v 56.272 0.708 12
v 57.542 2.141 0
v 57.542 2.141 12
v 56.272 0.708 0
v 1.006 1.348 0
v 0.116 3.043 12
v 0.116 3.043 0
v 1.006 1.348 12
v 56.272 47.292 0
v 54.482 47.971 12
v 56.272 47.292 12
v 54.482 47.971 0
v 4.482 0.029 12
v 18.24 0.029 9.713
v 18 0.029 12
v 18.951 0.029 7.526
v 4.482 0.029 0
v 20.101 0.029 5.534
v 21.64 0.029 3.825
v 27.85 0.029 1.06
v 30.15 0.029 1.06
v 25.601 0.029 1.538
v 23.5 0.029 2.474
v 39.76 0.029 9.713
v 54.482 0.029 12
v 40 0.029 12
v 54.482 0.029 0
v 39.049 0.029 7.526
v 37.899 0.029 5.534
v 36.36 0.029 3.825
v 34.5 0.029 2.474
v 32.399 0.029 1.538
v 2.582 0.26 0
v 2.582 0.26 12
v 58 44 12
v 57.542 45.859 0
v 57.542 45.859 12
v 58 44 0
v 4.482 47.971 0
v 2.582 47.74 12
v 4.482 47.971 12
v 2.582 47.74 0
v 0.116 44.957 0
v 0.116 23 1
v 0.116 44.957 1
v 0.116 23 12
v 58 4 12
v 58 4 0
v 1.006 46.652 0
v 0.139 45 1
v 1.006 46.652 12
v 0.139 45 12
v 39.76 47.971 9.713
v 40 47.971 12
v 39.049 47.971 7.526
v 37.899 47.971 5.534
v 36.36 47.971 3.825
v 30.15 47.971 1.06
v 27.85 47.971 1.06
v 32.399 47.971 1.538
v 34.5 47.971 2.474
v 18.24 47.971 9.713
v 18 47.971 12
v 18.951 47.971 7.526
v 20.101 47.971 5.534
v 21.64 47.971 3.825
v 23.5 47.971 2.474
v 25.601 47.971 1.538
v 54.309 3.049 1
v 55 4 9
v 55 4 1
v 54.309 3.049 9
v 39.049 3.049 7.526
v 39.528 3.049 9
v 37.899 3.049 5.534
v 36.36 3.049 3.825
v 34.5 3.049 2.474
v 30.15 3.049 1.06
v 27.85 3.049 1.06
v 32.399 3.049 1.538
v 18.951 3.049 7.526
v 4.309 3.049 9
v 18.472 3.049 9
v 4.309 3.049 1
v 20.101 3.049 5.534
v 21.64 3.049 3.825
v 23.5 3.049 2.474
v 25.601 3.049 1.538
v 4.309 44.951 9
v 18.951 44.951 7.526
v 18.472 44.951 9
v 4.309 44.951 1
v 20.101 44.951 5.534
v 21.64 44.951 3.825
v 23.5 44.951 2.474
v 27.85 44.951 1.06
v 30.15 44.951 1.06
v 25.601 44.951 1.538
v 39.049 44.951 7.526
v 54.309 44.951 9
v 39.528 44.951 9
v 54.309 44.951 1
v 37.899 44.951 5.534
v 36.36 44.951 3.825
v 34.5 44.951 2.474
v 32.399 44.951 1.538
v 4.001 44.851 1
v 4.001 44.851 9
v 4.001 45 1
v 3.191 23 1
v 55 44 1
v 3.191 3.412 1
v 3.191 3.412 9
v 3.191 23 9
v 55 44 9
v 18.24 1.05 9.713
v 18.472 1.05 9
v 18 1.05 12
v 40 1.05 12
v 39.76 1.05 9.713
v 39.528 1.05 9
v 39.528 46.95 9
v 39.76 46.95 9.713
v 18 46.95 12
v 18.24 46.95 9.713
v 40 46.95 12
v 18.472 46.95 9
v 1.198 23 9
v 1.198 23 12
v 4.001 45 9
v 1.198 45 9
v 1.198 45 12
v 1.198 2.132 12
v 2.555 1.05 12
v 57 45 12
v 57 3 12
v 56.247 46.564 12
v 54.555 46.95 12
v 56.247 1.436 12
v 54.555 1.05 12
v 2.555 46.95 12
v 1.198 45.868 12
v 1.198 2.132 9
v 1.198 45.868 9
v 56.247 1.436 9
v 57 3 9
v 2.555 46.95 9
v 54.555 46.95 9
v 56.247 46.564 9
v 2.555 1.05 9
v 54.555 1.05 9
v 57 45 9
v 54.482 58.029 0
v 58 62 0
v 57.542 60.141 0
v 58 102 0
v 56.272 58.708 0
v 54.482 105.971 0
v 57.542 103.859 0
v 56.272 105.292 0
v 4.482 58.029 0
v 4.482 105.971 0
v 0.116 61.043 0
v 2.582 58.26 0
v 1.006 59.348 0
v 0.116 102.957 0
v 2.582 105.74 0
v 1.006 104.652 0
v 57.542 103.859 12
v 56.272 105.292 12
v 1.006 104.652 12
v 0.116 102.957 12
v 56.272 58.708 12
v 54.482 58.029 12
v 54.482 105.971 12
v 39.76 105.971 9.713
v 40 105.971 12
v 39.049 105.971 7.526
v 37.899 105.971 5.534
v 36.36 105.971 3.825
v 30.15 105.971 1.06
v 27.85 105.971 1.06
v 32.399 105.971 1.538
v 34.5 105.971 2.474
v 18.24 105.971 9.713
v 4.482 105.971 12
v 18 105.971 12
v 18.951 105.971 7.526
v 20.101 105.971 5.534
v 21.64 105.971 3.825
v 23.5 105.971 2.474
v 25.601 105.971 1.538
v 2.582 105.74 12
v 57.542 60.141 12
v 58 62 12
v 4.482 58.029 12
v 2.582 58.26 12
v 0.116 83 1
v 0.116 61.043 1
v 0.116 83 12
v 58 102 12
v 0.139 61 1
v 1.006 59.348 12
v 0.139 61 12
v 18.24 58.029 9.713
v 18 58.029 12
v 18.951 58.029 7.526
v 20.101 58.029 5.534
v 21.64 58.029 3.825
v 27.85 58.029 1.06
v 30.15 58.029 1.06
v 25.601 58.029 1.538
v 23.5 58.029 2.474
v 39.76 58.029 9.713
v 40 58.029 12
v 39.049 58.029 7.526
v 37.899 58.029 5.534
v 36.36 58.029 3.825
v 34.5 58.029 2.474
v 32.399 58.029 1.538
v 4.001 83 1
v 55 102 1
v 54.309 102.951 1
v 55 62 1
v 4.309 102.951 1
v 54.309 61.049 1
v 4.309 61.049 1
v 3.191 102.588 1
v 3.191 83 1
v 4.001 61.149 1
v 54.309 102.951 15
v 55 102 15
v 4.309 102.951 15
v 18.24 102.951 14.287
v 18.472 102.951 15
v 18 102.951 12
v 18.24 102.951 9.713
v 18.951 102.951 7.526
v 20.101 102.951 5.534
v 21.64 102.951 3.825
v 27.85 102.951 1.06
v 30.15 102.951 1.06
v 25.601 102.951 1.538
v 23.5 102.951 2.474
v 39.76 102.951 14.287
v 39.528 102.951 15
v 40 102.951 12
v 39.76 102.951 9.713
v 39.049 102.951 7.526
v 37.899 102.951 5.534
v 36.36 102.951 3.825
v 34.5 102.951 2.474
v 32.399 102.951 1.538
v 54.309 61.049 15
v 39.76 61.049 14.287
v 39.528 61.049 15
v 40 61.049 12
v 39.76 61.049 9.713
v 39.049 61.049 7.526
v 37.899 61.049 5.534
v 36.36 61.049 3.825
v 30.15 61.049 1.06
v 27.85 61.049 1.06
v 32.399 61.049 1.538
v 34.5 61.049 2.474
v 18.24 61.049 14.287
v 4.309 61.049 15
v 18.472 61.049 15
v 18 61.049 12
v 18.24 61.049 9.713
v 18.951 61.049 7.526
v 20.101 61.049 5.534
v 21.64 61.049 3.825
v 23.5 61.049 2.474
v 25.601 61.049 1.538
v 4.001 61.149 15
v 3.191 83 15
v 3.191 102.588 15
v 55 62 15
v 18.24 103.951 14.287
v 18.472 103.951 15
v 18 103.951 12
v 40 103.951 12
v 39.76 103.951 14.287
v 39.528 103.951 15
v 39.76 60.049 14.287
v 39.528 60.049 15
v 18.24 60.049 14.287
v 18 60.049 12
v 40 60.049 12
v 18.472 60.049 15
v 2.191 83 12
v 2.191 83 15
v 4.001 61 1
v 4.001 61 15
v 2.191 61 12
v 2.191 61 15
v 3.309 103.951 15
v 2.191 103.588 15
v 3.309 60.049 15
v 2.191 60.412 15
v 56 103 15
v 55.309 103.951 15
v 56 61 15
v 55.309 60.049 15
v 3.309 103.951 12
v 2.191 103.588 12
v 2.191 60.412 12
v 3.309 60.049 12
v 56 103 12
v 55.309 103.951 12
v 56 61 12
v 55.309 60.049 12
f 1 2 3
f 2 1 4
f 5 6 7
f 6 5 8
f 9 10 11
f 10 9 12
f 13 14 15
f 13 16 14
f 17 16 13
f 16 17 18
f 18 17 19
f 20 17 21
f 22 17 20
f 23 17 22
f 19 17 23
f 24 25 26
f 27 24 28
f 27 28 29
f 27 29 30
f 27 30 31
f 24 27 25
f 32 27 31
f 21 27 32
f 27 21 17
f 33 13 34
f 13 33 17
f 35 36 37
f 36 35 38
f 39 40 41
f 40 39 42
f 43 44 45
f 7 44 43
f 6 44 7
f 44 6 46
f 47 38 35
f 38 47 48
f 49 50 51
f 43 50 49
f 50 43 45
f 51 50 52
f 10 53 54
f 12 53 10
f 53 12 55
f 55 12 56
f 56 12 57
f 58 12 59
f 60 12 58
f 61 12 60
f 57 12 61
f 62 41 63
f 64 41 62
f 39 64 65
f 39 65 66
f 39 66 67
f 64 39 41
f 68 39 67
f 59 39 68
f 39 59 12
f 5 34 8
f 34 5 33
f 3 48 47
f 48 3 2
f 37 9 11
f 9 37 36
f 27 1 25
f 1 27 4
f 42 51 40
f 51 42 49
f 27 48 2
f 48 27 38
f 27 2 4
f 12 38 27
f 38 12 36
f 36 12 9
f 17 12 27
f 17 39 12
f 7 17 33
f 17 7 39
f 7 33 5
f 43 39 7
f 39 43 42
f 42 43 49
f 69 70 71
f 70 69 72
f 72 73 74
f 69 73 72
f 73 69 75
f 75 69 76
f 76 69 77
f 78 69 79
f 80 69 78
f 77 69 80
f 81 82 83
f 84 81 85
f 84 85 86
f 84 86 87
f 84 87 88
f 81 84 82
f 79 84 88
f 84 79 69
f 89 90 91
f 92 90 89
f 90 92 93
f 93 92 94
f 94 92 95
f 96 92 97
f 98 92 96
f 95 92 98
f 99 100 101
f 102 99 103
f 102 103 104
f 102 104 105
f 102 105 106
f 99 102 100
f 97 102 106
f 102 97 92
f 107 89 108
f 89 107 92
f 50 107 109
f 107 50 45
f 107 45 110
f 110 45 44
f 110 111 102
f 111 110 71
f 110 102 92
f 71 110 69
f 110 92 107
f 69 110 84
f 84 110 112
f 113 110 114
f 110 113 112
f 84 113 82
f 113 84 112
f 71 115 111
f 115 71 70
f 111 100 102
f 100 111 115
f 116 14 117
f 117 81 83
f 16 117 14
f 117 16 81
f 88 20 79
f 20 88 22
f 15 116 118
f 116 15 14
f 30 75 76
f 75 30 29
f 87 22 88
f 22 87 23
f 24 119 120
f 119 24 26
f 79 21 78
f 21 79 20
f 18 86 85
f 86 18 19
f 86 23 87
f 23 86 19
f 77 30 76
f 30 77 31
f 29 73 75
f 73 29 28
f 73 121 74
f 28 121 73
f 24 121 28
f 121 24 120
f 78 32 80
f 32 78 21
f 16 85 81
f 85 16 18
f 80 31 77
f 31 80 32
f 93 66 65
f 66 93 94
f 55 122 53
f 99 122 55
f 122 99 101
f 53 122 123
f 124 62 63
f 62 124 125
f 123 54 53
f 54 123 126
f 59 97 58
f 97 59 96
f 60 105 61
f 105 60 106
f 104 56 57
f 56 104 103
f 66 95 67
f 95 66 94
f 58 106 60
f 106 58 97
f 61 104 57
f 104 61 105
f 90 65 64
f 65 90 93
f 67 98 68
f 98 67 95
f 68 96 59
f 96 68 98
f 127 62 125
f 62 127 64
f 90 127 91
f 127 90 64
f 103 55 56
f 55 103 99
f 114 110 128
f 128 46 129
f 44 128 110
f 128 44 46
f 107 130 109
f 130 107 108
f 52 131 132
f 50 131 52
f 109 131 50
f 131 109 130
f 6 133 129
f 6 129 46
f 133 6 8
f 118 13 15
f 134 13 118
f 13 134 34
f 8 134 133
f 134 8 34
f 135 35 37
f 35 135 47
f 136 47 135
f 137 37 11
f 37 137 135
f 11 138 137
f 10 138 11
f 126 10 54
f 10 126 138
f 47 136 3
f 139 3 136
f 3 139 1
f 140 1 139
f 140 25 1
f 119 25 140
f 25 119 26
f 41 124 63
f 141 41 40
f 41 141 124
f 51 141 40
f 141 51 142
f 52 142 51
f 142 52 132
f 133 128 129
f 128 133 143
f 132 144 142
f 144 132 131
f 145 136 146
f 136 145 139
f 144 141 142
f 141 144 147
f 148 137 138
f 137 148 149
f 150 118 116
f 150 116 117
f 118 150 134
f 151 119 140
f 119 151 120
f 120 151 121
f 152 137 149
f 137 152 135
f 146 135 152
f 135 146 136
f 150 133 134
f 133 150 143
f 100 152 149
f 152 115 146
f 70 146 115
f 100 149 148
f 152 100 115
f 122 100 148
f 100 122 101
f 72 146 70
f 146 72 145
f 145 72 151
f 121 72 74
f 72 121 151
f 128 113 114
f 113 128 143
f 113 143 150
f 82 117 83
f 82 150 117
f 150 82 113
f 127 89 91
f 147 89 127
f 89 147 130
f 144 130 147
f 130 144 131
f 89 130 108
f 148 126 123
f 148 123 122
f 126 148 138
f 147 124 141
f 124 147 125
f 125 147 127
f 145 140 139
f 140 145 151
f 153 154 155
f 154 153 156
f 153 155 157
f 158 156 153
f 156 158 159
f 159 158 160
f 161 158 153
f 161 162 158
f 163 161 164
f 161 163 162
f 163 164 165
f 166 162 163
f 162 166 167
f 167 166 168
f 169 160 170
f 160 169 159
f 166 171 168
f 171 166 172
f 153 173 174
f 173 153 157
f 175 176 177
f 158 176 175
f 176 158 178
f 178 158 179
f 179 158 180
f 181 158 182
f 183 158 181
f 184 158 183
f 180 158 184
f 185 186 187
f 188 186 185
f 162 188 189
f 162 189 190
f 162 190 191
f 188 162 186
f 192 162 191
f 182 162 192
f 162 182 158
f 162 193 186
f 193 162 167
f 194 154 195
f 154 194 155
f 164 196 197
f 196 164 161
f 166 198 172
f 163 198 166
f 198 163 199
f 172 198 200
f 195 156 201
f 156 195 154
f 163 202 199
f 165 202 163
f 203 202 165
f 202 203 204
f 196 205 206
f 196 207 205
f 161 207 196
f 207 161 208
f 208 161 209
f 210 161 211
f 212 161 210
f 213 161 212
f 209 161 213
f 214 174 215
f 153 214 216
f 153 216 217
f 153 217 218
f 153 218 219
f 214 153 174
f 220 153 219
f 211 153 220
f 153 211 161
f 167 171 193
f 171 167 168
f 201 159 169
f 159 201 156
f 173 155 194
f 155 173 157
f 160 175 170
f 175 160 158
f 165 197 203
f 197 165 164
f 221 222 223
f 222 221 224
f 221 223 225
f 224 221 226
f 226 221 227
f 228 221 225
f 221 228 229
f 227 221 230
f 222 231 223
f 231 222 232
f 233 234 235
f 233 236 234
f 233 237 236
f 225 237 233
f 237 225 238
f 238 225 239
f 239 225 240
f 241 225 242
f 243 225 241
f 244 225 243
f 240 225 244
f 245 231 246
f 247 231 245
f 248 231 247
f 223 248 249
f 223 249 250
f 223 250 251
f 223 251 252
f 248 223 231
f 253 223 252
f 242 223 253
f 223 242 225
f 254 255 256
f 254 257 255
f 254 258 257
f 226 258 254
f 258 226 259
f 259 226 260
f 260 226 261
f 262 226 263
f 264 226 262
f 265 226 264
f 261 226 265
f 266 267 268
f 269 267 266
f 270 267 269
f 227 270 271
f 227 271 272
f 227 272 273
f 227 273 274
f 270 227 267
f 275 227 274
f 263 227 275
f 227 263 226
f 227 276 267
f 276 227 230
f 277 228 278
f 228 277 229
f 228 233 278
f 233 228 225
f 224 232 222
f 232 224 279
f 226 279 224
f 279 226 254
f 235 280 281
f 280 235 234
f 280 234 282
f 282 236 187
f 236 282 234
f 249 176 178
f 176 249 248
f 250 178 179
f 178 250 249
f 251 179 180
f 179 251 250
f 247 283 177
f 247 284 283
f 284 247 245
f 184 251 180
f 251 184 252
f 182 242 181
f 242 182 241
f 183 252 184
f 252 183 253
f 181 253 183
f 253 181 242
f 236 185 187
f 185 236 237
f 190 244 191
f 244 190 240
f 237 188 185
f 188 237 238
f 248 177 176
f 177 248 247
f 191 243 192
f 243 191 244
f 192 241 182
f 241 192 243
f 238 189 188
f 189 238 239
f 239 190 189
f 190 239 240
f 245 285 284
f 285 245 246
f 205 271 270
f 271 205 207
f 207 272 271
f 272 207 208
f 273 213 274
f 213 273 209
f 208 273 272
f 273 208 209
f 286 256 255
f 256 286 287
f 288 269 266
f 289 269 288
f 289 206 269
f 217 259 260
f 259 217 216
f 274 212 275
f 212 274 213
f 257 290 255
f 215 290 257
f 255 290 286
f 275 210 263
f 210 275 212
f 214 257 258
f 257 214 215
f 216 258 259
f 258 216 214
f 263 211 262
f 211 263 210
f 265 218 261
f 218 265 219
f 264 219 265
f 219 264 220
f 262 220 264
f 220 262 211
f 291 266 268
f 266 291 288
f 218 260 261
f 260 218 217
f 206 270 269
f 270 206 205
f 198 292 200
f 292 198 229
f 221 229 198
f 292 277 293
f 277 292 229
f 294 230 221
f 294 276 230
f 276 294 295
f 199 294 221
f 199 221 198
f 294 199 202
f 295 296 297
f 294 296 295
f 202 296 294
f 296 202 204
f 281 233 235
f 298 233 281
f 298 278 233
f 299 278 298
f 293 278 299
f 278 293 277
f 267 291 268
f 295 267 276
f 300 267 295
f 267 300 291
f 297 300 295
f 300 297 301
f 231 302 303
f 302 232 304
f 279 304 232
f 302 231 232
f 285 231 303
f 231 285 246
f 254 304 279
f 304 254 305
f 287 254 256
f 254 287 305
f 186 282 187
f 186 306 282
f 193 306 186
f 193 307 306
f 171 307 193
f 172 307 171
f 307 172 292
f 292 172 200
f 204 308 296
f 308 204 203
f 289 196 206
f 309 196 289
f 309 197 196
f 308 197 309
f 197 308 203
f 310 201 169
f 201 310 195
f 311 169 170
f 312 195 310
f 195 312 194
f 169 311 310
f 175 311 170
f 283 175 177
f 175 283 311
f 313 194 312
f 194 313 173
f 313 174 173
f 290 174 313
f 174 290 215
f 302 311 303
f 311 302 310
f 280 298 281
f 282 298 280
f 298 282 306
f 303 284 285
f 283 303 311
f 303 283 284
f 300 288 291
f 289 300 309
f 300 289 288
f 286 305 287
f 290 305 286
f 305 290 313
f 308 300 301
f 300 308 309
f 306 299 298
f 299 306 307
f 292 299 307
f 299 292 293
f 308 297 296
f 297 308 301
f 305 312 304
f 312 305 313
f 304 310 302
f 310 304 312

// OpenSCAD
// file: lib_metric_sizes.scad
m2   = 2.8;
m2_5 = 3.2;
m3   = 3.6;
m4   = 4.8;
m5   = 5.6;
m6   = 6.4;
// file: lib_nuts.scad
include <lib_metric_sizes.scad>

m2_nut = [5.2, 1.7];
m3_nut = [6.8, 2.3];
m4_nut = [8.4, 2.8];

m2_flat_nut = [5.2, 2.0];
m3_flat_nut = [6.8, 2.0];
m4_flat_nut = [8.4, 2.0];

//m2_nylon_nut = [, ];
//m2_5_nylon_nut = [, ];
//m3_nylon_nut = [, ];
m4_nylon_nut = [8.4, 3.3];
m5_nylon_nut = [10.0, 4.0];
m6_nylon_nut = [12.4, 5.0];
// file: lib_self_tapping_screws.scad
include <lib_metric_sizes.scad>

m3_st_roundhead = [7.2, 2.0];
m3_st_flathead = [7.2, 0];
// file: lib_machine_screws.scad
include <lib_metric_sizes.scad>

m2x12_shaft = [m2, 12.0];
m2x19_shaft = [m2, 19.0];
m3x12_shaft = [m3, 12.0];
m3x17_shaft = [m3, 17.0];
m3x19_shaft = [m3, 19.0];
m4x12_shaft = [m4, 12.0];
m4x25_shaft = [m4, 25.0];

m2_roundhead = [4.0, 1.0];
m3_roundhead = [5.6, 1.7];
m4_roundhead = [7.2, 2.3];

m2_flathead = [4.0, 1.0];
m3_flathead = [5.6, 1.0];
m4_flathead = [7.2, 1.0];
// file: lib_gadgets.scad
include <lib_machine_screws.scad>
include <lib_self_tapping_screws.scad>
include <lib_nuts.scad>

module stud(shaft, self_tapping=false)
{
	ds = self_tapping ? shaft[0]-0.4 : shaft[0];
	
	cylinder(h=shaft[1], d=ds);
}

module bolt(head, shaft, countersink=false, self_tapping=false) {
	ds = self_tapping ? shaft[0]-0.4 : shaft[0];
	
	cylinder(h=head[1], d=head[0]);
	cylinder(h=shaft[1]+head[1], d=ds);
	if (countersink == true) {
		translate([0, 0, head[1]]) {
			cylinder(h=head[0], d1=head[0], d2=0);
		}
	}
}

module nut(head, countersink=false) {
	cylinder(h=head[1], d=head[0], $fn=6);
	if (countersink == true) {
		translate([0, 0, head[1]]) {
			cylinder(h=head[0], d1=head[0], d2=0, $fn=6);
		}
	}
}

module post(pos, radius, height) {
	translate([pos[0], pos[1], 0]) { 
		cylinder(h=height, r=radius); 
	}
}

module spacer(pos, outer_r, inner_r, height) {
	translate([pos[0], pos[1], 0]) { 
		difference() {
			cylinder(h=height, r=outer_r); 
			if (inner_r > 0) {
				cylinder(h=height+0.0001, r=inner_r); 
			}
		}
	}
}

module grid(size, xx, yy) {
	if (size > 0) {
		for (x = [0 : size : xx] ) {
			translate([x, 0, 0]) cube([0.8, yy, 0.4]);
		}
		for (y = [0 : size : yy] ) {
			translate([0, y, 0]) cube([xx, 0.8, 0.4]);
		}
	}
}
// file: lib_soft.scad
/** 
 * An OpenSCAD library for creating shapes with rounded edges
 *
 * @author Paul Generes <paul.generes@gmail.com>
 * @example soft_example.scad
 */
 
module soft_cube(size=[1, 1, 1], center=false, cr=1) {
	tr = [cr, cr, cr];

    translate(tr) {
        minkowski() {
            sphere(cr);
            cube([size[0]-2*cr, size[1]-2*cr, size[2]-2*cr], center);
        }
    }
}

module softxyz_cube(size=1, center=false, cr=[1, 1, 1]) {
	tr = cr;

    translate(tr) {
        minkowski() {
			scale(cr) {
				sphere(1);
			}
            cube([size[0]-2*cr[0], size[1]-2*cr[1], size[2]-2*cr[2]], center);
        }
    }
}

module softz_cube(size=1, center=false, cr=1) {
	tr = [cr, cr, 0];

    translate(tr) {
        minkowski() {
			cylinder(h=0.00001, r=cr);
			cube([size[0]-2*cr, size[1]-2*cr, size[2]-0.00001], center);
        }
    }
}
// main file
// Test Enclosure

include <lib_enclosure.scad>

function fillet_z()         = 0;
function tolerance()        = 1;
function device_x()         = 50;
function device_y()         = 40;
function pcb_z()            = 1;
function spacing()          = 10;
function riser_z()          = 0;
function riser_thickness()  = 0;
function wall_thickness()   = 3;
function bottom_thickness() = 1;
function top_thickness()    = 1;
function device_z()         = 20;
function friction()         = 3;
function split()            = 0.5;

//finished_enclosure();
enclosure();

module left_cutouts() {
    //square_cutout([device_y()/2, device_z()/2], [device_z(), device_z()]);
    square_cutout([0, 0], [device_z(), device_z()], false, false);
}
module right_cutouts() {}
module front_cutouts() {
    circle_cutout([device_x()/2, device_z()/2], device_z()/2);
}
module back_cutouts() {
    circle_cutout([device_x()/2, device_z()/2], device_z()/2);
}
module top_cutouts() {}
module bottom_cutouts() {}
module cutouts() {}
module attachments() {}
module stand_offs() {}
module final_attachments() {}
